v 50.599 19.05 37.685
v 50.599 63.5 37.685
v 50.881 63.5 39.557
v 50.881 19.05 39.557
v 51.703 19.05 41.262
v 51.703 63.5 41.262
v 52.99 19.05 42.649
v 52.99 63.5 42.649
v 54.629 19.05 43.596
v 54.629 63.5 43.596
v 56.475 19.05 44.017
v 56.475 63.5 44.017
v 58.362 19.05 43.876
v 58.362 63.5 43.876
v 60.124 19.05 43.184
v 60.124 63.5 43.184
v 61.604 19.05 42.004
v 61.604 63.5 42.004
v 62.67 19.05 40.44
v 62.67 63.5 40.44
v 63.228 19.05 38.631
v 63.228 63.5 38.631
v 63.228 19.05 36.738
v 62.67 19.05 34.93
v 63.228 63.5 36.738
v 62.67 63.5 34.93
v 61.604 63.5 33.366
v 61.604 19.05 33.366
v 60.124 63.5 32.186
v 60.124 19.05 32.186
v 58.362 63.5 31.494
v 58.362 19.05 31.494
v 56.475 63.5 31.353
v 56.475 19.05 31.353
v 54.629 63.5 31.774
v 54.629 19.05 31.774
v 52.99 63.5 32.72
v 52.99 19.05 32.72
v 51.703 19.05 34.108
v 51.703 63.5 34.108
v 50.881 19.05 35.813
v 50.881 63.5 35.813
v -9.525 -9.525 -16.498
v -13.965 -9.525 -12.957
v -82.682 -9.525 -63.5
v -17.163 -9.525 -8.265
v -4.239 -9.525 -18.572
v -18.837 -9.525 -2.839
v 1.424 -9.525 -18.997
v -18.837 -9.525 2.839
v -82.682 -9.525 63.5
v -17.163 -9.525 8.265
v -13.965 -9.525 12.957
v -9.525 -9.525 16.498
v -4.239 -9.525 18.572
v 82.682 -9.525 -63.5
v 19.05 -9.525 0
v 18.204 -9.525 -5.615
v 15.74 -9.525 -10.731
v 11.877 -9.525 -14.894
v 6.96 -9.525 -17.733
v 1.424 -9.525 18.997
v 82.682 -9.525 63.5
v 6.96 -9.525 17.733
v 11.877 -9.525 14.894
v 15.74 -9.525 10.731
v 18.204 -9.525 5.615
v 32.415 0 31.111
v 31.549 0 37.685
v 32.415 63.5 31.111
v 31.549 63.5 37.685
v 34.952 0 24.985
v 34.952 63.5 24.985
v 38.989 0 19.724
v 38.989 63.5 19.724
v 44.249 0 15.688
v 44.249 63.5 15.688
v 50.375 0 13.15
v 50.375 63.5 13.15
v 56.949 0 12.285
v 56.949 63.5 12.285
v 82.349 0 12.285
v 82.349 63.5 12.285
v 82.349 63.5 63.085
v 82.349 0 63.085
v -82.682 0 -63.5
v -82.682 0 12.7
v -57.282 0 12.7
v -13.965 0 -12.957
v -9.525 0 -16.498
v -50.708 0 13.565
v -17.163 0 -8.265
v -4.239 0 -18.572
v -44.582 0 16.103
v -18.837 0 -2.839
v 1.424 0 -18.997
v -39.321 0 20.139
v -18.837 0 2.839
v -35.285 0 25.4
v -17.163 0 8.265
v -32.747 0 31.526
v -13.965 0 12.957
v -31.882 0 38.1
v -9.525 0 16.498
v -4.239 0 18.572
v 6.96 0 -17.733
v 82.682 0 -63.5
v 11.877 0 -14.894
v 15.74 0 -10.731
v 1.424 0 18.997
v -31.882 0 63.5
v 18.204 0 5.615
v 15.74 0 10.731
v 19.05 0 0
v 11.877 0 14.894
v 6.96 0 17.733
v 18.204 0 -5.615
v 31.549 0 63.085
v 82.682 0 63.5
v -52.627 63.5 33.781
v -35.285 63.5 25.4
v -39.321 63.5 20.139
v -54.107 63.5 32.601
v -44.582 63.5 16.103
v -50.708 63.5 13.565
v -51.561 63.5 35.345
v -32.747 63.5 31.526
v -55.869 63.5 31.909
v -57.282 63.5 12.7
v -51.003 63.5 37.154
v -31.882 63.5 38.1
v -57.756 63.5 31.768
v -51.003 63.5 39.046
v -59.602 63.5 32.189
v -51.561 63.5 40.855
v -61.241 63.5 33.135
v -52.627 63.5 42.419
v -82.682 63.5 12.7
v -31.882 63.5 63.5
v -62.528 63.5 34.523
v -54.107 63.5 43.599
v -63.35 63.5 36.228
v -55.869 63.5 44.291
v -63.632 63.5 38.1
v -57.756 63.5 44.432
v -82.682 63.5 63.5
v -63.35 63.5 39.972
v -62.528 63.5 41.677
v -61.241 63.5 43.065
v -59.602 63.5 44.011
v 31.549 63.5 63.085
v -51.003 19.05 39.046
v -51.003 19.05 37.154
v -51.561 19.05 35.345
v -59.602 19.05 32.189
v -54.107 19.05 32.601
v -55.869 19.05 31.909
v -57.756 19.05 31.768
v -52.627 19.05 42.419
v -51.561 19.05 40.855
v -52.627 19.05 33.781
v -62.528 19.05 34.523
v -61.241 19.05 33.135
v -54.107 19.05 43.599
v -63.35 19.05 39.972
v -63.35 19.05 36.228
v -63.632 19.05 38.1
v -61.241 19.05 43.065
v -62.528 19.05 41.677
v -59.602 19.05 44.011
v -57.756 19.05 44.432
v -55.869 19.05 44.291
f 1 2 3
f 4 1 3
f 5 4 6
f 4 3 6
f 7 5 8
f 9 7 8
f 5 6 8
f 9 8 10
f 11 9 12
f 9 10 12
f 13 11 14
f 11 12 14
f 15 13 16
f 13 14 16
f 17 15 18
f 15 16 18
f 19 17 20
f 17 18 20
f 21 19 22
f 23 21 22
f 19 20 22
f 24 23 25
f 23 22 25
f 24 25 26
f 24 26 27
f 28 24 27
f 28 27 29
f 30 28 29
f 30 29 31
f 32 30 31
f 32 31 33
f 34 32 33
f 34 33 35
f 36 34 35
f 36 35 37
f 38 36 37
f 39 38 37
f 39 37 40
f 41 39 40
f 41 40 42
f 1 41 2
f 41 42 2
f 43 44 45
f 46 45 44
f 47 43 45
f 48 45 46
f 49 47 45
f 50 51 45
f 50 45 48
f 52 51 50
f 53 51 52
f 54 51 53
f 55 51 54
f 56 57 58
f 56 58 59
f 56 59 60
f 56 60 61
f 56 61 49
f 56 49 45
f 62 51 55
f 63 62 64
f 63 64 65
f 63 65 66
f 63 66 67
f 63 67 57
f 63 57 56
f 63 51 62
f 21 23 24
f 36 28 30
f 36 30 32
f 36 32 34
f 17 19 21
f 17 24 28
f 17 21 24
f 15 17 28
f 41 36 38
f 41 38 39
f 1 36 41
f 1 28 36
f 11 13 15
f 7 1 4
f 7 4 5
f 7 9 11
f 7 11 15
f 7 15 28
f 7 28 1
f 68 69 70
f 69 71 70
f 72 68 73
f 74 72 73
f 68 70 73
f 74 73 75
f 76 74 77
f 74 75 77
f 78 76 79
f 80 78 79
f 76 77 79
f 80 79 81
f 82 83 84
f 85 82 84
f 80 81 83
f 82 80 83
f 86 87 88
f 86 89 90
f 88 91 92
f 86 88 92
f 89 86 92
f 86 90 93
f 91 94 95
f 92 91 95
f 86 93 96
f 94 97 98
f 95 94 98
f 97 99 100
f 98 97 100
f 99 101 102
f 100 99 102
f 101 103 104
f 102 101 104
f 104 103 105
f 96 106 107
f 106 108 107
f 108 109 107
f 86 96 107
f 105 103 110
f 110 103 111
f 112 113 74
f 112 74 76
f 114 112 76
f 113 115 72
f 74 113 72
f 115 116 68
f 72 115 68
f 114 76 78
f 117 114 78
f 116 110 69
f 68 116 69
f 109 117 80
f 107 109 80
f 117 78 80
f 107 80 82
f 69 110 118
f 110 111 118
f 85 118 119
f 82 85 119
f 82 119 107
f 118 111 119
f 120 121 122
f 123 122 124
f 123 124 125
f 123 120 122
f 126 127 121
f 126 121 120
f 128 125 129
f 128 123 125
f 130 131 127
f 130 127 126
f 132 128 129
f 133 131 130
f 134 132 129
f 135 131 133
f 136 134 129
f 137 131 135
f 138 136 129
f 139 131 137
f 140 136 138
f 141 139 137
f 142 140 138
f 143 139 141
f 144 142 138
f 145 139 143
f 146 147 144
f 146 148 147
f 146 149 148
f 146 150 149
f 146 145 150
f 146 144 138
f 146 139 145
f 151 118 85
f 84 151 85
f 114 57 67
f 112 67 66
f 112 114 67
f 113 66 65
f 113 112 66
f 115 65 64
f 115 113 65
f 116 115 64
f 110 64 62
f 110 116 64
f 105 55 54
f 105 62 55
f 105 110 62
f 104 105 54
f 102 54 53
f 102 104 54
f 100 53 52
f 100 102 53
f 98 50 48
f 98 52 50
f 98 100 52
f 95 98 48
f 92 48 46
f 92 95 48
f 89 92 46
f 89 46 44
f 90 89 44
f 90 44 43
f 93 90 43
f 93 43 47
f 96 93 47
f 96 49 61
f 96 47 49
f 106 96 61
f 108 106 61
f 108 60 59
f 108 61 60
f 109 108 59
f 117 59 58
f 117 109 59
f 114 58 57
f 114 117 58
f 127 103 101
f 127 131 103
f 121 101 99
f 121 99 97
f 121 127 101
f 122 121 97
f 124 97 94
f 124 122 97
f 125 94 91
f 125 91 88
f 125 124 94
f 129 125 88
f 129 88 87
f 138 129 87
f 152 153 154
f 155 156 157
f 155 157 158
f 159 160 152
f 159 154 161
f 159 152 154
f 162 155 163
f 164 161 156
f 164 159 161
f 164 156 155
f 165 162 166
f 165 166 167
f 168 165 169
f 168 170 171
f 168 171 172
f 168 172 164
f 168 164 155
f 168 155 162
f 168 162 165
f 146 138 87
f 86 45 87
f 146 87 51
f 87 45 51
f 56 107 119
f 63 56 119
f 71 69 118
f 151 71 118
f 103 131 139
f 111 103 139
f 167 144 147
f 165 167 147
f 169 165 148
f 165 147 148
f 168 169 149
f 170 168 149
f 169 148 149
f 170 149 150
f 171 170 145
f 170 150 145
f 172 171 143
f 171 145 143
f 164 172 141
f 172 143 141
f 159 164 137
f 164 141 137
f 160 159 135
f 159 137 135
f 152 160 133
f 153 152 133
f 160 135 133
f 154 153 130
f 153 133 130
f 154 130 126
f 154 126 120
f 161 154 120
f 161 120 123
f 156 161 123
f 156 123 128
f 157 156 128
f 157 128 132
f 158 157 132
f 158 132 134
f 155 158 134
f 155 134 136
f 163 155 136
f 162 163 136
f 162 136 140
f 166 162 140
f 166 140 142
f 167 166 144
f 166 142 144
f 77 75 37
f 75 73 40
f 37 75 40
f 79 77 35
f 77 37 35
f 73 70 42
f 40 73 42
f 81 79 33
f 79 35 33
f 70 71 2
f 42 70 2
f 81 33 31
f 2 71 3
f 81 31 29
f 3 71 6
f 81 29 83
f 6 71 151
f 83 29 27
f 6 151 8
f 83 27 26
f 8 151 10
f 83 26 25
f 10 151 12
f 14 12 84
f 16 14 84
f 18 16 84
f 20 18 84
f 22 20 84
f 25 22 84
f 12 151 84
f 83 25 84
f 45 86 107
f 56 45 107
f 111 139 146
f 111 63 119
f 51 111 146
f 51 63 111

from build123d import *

# Parameters (mm, degrees)
F0_W      = 165.363372
F0_H      = 127
F1_DEPTH  = 9.525
F2_W      = 50.8
F2_H      = 50.800003
F3_DEPTH  = 63.5
F4_W      = 50.8
F4_H      = 50.8
F5_DEPTH  = 63.5
F6_R      = 25.4
F7_R      = 19.05
F8_DEPTH  = 63.501
F9_R      = 19.05
F10_DEPTH = 63.501
F11_R     = 19.05
F12_DEPTH = 9.526
F13_R     = 6.35
F14_DEPTH = 44.45


with BuildPart() as f1:
    # F0 (on Front) → F1 (new body)
    with BuildSketch(Plane.XZ):
        Rectangle(F0_W, F0_H)
    extrude(amount=F1_DEPTH)

    # F2 (on Front) → F3 (join)
    with BuildSketch(Plane.XZ):
        with Locations((56.94912, 37.684852)):
            Rectangle(F2_W, F2_H)
    extrude(amount=-F3_DEPTH)

    # F4 (on face) → F5 (join)
    with BuildSketch(Plane(origin=(0, 0, 0), x_dir=(-1, 0, 0), z_dir=(0, 1, 0))):
        with Locations((57.281686, 38.1)):
            Rectangle(F4_W, F4_H)
    extrude(amount=F5_DEPTH)

    # F6
    f6_edges = [f1.edges().sort_by_distance(p)[0] for p in [
        (31.54912, 31.75, 12.284851),
        (-31.881686, 31.75, 12.7),
    ]]
    fillet(f6_edges, radius=F6_R)

    # F7 (on Front) → F8 (cut, through all)
    with BuildSketch(Plane.XZ):
        Circle(F7_R)
    extrude(amount=-F8_DEPTH, mode=Mode.SUBTRACT)

    # F9 (on Front) → F10 (cut, through all)
    with BuildSketch(Plane.XZ):
        Circle(F9_R)
    extrude(amount=-F10_DEPTH, mode=Mode.SUBTRACT)

    # F11 (on Front) → F12 (cut, through all)
    with BuildSketch(Plane.XZ):
        Circle(F11_R)
    extrude(amount=F12_DEPTH, mode=Mode.SUBTRACT)

    # F13 (on face) → F14 (cut)
    with BuildSketch(Plane(origin=(0, 63.5, 0), x_dir=(-1, 0, 0), z_dir=(0, 1, 0))):
        with Locations((-56.94912, 37.684854)):
            Circle(F13_R)
        with Locations((57.281686, 38.1)):
            Circle(F13_R)
    extrude(amount=-F14_DEPTH, mode=Mode.SUBTRACT)


solid = f1.part
